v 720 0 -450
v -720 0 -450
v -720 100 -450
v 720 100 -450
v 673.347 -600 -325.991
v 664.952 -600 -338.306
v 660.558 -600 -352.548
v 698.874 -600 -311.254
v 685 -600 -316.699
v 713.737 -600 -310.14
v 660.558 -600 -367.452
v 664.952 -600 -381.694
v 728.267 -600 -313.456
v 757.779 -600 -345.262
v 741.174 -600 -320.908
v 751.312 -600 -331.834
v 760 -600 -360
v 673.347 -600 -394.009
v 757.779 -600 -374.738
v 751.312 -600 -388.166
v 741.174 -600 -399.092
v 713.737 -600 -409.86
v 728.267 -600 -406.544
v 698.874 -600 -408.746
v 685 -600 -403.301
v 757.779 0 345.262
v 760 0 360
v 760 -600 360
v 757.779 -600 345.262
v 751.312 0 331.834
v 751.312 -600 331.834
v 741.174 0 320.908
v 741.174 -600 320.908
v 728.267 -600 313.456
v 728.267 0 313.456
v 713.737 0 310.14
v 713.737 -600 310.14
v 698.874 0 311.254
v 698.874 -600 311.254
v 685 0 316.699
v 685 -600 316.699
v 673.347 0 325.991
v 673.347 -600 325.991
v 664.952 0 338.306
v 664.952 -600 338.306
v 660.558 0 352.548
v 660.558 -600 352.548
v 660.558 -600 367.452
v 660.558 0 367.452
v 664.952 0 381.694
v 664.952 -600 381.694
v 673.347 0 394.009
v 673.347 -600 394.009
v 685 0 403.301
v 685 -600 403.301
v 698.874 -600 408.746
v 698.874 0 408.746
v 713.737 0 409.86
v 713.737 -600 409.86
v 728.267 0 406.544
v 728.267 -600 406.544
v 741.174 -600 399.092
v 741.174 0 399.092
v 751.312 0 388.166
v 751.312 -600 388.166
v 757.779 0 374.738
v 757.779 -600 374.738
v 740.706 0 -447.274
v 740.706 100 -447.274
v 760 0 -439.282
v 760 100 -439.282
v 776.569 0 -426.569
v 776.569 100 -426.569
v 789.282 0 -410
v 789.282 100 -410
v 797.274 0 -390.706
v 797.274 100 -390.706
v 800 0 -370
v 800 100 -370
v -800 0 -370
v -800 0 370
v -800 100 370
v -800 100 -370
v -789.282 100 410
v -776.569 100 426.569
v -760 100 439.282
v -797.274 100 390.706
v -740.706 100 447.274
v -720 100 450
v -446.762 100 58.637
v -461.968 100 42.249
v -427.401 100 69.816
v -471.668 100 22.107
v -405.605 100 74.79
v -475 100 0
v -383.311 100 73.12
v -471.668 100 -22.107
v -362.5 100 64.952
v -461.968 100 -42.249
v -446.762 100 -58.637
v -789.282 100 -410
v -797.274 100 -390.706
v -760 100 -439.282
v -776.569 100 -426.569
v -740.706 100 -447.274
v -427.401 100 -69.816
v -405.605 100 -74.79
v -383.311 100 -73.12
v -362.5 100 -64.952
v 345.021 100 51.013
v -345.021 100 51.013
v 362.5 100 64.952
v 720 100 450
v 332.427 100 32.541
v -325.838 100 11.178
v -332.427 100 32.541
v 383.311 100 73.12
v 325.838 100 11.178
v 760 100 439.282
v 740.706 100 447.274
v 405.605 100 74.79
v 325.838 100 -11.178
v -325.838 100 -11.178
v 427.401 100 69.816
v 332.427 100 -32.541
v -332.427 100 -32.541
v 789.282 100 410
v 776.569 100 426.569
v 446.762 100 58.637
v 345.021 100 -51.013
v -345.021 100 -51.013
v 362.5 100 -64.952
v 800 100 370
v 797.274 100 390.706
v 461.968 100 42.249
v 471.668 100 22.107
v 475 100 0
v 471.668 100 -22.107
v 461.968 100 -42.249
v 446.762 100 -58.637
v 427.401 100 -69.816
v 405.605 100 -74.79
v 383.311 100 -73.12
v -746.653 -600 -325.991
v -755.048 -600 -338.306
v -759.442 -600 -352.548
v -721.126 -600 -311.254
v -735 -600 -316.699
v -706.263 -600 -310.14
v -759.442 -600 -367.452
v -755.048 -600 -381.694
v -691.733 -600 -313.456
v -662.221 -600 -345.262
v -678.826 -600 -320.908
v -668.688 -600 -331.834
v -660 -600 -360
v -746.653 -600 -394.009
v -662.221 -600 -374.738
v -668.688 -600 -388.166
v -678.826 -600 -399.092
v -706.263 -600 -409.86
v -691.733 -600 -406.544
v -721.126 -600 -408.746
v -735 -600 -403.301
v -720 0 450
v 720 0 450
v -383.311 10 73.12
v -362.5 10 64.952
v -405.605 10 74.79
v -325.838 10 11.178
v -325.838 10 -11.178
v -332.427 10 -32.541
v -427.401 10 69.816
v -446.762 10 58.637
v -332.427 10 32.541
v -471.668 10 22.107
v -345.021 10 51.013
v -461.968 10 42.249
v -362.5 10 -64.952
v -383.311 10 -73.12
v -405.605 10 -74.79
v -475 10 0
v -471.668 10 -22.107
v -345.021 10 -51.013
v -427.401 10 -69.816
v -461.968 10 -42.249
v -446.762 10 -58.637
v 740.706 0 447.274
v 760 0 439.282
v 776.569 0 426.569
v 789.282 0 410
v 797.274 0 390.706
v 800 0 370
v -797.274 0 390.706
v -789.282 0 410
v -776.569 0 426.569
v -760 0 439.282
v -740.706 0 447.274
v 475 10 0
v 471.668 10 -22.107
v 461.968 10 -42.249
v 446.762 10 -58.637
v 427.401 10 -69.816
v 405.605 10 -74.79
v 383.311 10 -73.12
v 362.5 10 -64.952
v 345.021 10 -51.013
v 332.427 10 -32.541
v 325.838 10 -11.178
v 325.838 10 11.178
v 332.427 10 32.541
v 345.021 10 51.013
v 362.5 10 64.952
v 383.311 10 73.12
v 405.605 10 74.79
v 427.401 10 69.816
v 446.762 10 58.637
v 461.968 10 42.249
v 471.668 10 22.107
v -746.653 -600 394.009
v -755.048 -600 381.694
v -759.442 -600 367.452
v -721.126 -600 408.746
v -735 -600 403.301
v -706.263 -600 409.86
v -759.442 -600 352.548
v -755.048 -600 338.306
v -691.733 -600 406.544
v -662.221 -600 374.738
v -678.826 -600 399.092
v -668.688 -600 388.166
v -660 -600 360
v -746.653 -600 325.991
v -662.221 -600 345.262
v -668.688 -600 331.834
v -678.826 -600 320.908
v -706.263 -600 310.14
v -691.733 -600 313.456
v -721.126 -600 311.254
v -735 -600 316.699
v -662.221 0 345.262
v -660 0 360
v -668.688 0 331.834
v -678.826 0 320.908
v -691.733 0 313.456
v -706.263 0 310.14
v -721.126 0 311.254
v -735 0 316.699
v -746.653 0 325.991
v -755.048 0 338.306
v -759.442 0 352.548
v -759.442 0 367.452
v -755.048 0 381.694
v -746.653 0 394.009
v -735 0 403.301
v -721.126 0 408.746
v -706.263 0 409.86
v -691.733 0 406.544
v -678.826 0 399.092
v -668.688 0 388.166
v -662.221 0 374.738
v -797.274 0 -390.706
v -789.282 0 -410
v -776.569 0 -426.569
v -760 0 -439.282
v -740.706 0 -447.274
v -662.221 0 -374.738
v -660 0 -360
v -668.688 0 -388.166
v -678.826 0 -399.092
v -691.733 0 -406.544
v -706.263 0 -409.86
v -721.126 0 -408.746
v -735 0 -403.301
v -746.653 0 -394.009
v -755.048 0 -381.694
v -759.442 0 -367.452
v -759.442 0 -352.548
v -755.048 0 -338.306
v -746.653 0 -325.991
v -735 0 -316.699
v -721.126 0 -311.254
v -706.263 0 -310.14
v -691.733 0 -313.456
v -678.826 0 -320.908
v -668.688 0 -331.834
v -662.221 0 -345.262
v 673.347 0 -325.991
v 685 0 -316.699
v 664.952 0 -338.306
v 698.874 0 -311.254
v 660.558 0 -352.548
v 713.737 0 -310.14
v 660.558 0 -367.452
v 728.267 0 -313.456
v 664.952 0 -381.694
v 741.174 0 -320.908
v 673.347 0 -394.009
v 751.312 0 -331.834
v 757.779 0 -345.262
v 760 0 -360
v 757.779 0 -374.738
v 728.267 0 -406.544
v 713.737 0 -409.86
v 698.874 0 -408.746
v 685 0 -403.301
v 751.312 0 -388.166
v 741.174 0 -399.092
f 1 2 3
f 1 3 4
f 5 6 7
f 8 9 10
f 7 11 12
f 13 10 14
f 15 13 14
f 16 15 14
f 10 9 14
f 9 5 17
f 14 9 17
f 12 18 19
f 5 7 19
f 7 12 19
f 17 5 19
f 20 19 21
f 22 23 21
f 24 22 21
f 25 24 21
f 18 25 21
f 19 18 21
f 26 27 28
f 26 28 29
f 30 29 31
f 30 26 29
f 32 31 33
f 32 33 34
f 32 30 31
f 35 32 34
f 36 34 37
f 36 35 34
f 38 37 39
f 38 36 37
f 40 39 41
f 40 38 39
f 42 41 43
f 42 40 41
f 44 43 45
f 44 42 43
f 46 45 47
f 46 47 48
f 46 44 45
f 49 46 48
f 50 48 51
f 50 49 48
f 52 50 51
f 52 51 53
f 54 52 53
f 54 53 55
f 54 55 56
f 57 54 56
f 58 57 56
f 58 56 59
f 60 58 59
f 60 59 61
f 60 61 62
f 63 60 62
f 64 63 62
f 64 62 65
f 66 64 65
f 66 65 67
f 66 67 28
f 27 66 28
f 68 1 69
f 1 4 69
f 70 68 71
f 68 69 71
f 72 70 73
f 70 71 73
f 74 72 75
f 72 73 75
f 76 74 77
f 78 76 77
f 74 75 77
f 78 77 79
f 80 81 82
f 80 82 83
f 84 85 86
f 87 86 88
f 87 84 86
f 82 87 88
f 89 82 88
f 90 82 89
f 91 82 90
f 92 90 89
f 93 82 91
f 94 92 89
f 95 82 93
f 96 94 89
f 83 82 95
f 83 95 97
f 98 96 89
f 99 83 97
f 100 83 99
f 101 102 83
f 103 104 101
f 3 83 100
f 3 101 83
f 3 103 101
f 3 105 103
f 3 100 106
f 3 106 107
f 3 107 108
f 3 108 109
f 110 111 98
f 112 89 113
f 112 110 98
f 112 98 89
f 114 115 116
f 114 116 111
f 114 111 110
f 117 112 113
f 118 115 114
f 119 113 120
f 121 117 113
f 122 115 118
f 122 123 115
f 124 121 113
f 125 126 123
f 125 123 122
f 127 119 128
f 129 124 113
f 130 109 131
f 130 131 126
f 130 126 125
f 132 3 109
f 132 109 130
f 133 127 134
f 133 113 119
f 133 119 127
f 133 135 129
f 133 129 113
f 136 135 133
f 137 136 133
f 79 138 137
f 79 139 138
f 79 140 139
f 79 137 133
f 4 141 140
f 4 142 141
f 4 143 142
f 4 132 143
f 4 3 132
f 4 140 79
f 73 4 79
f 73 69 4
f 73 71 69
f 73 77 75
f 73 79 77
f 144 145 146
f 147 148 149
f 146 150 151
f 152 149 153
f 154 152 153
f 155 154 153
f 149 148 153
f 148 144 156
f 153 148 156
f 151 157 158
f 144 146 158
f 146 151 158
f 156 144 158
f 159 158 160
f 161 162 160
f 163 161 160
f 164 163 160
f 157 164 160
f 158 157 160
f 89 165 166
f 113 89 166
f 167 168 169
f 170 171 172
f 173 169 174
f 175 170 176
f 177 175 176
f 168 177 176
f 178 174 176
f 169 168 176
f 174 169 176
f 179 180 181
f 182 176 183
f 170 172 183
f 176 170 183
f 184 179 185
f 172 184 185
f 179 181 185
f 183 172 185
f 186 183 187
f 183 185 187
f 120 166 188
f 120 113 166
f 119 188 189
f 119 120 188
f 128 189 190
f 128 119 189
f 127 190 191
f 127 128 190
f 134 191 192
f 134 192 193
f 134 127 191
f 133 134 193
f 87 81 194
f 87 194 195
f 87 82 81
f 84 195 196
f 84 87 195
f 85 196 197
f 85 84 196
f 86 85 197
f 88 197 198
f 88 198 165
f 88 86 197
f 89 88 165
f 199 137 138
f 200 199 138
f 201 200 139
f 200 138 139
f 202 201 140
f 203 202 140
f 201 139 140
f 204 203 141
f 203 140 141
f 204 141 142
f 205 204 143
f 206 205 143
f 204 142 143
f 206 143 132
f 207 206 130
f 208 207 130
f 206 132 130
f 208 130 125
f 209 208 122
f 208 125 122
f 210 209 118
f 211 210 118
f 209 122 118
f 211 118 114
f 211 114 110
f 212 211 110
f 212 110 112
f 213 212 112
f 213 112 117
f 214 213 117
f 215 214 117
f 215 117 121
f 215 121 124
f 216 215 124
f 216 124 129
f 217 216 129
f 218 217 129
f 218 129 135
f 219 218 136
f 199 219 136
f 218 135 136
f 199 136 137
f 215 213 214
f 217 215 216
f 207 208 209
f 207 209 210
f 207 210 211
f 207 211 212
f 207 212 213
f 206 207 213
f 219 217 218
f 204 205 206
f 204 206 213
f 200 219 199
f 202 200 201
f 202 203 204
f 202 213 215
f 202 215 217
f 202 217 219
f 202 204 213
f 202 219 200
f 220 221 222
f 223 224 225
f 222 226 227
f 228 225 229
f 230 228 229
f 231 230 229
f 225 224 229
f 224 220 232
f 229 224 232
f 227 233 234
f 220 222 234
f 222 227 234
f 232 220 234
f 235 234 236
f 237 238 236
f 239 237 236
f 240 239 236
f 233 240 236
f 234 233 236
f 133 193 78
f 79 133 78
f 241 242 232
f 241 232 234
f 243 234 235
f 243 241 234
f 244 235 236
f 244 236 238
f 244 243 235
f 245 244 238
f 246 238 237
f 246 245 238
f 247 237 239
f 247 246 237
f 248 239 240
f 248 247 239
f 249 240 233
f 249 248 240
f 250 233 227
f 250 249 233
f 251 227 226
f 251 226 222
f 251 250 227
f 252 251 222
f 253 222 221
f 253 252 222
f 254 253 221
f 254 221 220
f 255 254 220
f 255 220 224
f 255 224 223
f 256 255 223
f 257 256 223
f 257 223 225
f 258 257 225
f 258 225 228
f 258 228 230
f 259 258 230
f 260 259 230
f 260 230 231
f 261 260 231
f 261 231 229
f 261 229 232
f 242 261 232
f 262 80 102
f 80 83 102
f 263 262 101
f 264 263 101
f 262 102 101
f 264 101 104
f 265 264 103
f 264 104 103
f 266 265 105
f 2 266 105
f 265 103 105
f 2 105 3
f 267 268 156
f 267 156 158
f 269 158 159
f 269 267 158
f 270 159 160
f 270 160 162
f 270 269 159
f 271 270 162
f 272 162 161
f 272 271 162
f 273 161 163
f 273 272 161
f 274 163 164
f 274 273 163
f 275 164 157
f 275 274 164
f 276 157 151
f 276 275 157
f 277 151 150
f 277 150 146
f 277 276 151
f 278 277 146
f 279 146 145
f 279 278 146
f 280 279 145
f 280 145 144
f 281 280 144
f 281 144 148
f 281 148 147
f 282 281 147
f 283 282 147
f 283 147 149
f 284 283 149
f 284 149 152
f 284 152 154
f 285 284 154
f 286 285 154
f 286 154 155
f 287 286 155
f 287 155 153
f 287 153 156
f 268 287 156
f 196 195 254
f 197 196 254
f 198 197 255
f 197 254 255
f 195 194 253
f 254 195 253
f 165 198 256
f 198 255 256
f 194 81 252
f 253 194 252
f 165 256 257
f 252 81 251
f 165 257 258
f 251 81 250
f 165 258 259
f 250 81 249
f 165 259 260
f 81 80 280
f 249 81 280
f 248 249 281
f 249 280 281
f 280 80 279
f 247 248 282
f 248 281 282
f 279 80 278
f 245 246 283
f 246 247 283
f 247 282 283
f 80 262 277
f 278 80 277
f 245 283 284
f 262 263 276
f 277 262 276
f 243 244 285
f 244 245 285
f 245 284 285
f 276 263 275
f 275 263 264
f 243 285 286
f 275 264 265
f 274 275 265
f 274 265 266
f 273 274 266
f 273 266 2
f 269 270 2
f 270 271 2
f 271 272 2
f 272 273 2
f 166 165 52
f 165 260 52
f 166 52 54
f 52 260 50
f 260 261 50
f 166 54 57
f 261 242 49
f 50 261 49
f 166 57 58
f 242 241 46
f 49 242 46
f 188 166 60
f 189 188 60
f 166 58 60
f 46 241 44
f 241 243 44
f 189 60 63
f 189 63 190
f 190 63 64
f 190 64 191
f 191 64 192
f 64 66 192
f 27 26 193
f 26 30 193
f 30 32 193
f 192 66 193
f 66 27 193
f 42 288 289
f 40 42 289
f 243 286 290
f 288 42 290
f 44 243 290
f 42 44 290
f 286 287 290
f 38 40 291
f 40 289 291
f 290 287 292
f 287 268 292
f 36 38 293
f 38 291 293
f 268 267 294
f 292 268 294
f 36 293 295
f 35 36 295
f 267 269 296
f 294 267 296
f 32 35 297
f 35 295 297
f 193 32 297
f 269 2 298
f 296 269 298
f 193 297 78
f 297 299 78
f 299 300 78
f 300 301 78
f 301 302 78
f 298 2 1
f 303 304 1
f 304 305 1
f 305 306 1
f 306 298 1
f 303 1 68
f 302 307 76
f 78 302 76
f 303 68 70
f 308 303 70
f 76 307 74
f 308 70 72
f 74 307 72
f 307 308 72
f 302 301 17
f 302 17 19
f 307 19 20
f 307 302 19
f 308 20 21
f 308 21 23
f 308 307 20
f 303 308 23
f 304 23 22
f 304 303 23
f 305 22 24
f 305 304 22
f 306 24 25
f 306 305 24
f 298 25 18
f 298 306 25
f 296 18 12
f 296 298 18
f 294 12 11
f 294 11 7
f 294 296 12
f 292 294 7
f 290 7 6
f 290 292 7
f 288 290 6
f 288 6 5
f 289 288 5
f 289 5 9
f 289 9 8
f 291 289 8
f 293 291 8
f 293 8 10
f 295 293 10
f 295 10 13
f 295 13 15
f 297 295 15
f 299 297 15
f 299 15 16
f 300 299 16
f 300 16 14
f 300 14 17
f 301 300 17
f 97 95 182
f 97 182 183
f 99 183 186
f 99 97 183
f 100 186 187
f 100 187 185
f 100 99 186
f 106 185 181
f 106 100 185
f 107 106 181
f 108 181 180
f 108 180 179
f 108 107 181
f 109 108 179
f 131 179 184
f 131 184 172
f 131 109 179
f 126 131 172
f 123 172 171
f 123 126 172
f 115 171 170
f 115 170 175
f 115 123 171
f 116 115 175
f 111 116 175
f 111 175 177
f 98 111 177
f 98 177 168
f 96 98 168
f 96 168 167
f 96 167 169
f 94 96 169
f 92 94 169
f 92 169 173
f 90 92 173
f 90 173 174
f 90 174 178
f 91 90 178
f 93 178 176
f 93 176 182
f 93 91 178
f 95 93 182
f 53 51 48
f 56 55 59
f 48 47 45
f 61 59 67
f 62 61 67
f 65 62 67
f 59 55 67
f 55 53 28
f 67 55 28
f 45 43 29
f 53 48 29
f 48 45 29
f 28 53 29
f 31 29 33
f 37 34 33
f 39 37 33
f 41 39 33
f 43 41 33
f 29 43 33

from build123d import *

# Parameters (mm, degrees)
SKETCH5_W           = 1600
SKETCH5_H           = 900
BOSS_EXTRUDE4_DEPTH = 100
SKETCH6_R           = 50
BOSS_EXTRUDE5_DEPTH = 700
SKETCH8_R           = 75
CUT_EXTRUDE2_DEPTH  = 90
FILLET2_R           = 80


with BuildPart() as part:
    # Sketch5 → Boss-Extrude4 (new body)
    with BuildSketch(Plane(origin=(0, 0, 0), x_dir=(1, 0, 0), z_dir=(0, 1, 0))):
        Rectangle(SKETCH5_W, SKETCH5_H)
    extrude(amount=BOSS_EXTRUDE4_DEPTH)

    # Sketch6 → Boss-Extrude5 (add)
    with BuildSketch(Plane(origin=(0, 100, 0), x_dir=(1, 0, 0), z_dir=(0, 1, 0))):
        with Locations((-710, 360)):
            Circle(SKETCH6_R)
        with Locations((710, 360)):
            Circle(SKETCH6_R)
        with Locations((710, -360)):
            Circle(SKETCH6_R)
        with Locations((-710, -360)):
            Circle(SKETCH6_R)
    extrude(amount=-BOSS_EXTRUDE5_DEPTH)

    # Sketch8 → Cut-Extrude2 (cut)
    with BuildSketch(Plane(origin=(0, 100, 0), x_dir=(1, 0, 0), z_dir=(0, 1, 0))):
        with Locations((400, 0)):
            Circle(SKETCH8_R)
    cut_extrude2 = extrude(amount=-CUT_EXTRUDE2_DEPTH, mode=Mode.SUBTRACT)

    # Mirror1: Cut-Extrude2 across plane
    add(cut_extrude2.mirror(Plane(origin=(0, 0, 0), x_dir=(0, 0, 1), z_dir=(1, 0, 0))), mode=Mode.SUBTRACT)

    # Fillet2
    fillet2_edges = [part.edges().sort_by_distance(p)[0] for p in [
        (800, 50, 450),
        (-800, 50, 450),
        (-800, 50, -450),
        (800, 50, -450),
    ]]
    fillet(fillet2_edges, radius=FILLET2_R)


solid = part.part
